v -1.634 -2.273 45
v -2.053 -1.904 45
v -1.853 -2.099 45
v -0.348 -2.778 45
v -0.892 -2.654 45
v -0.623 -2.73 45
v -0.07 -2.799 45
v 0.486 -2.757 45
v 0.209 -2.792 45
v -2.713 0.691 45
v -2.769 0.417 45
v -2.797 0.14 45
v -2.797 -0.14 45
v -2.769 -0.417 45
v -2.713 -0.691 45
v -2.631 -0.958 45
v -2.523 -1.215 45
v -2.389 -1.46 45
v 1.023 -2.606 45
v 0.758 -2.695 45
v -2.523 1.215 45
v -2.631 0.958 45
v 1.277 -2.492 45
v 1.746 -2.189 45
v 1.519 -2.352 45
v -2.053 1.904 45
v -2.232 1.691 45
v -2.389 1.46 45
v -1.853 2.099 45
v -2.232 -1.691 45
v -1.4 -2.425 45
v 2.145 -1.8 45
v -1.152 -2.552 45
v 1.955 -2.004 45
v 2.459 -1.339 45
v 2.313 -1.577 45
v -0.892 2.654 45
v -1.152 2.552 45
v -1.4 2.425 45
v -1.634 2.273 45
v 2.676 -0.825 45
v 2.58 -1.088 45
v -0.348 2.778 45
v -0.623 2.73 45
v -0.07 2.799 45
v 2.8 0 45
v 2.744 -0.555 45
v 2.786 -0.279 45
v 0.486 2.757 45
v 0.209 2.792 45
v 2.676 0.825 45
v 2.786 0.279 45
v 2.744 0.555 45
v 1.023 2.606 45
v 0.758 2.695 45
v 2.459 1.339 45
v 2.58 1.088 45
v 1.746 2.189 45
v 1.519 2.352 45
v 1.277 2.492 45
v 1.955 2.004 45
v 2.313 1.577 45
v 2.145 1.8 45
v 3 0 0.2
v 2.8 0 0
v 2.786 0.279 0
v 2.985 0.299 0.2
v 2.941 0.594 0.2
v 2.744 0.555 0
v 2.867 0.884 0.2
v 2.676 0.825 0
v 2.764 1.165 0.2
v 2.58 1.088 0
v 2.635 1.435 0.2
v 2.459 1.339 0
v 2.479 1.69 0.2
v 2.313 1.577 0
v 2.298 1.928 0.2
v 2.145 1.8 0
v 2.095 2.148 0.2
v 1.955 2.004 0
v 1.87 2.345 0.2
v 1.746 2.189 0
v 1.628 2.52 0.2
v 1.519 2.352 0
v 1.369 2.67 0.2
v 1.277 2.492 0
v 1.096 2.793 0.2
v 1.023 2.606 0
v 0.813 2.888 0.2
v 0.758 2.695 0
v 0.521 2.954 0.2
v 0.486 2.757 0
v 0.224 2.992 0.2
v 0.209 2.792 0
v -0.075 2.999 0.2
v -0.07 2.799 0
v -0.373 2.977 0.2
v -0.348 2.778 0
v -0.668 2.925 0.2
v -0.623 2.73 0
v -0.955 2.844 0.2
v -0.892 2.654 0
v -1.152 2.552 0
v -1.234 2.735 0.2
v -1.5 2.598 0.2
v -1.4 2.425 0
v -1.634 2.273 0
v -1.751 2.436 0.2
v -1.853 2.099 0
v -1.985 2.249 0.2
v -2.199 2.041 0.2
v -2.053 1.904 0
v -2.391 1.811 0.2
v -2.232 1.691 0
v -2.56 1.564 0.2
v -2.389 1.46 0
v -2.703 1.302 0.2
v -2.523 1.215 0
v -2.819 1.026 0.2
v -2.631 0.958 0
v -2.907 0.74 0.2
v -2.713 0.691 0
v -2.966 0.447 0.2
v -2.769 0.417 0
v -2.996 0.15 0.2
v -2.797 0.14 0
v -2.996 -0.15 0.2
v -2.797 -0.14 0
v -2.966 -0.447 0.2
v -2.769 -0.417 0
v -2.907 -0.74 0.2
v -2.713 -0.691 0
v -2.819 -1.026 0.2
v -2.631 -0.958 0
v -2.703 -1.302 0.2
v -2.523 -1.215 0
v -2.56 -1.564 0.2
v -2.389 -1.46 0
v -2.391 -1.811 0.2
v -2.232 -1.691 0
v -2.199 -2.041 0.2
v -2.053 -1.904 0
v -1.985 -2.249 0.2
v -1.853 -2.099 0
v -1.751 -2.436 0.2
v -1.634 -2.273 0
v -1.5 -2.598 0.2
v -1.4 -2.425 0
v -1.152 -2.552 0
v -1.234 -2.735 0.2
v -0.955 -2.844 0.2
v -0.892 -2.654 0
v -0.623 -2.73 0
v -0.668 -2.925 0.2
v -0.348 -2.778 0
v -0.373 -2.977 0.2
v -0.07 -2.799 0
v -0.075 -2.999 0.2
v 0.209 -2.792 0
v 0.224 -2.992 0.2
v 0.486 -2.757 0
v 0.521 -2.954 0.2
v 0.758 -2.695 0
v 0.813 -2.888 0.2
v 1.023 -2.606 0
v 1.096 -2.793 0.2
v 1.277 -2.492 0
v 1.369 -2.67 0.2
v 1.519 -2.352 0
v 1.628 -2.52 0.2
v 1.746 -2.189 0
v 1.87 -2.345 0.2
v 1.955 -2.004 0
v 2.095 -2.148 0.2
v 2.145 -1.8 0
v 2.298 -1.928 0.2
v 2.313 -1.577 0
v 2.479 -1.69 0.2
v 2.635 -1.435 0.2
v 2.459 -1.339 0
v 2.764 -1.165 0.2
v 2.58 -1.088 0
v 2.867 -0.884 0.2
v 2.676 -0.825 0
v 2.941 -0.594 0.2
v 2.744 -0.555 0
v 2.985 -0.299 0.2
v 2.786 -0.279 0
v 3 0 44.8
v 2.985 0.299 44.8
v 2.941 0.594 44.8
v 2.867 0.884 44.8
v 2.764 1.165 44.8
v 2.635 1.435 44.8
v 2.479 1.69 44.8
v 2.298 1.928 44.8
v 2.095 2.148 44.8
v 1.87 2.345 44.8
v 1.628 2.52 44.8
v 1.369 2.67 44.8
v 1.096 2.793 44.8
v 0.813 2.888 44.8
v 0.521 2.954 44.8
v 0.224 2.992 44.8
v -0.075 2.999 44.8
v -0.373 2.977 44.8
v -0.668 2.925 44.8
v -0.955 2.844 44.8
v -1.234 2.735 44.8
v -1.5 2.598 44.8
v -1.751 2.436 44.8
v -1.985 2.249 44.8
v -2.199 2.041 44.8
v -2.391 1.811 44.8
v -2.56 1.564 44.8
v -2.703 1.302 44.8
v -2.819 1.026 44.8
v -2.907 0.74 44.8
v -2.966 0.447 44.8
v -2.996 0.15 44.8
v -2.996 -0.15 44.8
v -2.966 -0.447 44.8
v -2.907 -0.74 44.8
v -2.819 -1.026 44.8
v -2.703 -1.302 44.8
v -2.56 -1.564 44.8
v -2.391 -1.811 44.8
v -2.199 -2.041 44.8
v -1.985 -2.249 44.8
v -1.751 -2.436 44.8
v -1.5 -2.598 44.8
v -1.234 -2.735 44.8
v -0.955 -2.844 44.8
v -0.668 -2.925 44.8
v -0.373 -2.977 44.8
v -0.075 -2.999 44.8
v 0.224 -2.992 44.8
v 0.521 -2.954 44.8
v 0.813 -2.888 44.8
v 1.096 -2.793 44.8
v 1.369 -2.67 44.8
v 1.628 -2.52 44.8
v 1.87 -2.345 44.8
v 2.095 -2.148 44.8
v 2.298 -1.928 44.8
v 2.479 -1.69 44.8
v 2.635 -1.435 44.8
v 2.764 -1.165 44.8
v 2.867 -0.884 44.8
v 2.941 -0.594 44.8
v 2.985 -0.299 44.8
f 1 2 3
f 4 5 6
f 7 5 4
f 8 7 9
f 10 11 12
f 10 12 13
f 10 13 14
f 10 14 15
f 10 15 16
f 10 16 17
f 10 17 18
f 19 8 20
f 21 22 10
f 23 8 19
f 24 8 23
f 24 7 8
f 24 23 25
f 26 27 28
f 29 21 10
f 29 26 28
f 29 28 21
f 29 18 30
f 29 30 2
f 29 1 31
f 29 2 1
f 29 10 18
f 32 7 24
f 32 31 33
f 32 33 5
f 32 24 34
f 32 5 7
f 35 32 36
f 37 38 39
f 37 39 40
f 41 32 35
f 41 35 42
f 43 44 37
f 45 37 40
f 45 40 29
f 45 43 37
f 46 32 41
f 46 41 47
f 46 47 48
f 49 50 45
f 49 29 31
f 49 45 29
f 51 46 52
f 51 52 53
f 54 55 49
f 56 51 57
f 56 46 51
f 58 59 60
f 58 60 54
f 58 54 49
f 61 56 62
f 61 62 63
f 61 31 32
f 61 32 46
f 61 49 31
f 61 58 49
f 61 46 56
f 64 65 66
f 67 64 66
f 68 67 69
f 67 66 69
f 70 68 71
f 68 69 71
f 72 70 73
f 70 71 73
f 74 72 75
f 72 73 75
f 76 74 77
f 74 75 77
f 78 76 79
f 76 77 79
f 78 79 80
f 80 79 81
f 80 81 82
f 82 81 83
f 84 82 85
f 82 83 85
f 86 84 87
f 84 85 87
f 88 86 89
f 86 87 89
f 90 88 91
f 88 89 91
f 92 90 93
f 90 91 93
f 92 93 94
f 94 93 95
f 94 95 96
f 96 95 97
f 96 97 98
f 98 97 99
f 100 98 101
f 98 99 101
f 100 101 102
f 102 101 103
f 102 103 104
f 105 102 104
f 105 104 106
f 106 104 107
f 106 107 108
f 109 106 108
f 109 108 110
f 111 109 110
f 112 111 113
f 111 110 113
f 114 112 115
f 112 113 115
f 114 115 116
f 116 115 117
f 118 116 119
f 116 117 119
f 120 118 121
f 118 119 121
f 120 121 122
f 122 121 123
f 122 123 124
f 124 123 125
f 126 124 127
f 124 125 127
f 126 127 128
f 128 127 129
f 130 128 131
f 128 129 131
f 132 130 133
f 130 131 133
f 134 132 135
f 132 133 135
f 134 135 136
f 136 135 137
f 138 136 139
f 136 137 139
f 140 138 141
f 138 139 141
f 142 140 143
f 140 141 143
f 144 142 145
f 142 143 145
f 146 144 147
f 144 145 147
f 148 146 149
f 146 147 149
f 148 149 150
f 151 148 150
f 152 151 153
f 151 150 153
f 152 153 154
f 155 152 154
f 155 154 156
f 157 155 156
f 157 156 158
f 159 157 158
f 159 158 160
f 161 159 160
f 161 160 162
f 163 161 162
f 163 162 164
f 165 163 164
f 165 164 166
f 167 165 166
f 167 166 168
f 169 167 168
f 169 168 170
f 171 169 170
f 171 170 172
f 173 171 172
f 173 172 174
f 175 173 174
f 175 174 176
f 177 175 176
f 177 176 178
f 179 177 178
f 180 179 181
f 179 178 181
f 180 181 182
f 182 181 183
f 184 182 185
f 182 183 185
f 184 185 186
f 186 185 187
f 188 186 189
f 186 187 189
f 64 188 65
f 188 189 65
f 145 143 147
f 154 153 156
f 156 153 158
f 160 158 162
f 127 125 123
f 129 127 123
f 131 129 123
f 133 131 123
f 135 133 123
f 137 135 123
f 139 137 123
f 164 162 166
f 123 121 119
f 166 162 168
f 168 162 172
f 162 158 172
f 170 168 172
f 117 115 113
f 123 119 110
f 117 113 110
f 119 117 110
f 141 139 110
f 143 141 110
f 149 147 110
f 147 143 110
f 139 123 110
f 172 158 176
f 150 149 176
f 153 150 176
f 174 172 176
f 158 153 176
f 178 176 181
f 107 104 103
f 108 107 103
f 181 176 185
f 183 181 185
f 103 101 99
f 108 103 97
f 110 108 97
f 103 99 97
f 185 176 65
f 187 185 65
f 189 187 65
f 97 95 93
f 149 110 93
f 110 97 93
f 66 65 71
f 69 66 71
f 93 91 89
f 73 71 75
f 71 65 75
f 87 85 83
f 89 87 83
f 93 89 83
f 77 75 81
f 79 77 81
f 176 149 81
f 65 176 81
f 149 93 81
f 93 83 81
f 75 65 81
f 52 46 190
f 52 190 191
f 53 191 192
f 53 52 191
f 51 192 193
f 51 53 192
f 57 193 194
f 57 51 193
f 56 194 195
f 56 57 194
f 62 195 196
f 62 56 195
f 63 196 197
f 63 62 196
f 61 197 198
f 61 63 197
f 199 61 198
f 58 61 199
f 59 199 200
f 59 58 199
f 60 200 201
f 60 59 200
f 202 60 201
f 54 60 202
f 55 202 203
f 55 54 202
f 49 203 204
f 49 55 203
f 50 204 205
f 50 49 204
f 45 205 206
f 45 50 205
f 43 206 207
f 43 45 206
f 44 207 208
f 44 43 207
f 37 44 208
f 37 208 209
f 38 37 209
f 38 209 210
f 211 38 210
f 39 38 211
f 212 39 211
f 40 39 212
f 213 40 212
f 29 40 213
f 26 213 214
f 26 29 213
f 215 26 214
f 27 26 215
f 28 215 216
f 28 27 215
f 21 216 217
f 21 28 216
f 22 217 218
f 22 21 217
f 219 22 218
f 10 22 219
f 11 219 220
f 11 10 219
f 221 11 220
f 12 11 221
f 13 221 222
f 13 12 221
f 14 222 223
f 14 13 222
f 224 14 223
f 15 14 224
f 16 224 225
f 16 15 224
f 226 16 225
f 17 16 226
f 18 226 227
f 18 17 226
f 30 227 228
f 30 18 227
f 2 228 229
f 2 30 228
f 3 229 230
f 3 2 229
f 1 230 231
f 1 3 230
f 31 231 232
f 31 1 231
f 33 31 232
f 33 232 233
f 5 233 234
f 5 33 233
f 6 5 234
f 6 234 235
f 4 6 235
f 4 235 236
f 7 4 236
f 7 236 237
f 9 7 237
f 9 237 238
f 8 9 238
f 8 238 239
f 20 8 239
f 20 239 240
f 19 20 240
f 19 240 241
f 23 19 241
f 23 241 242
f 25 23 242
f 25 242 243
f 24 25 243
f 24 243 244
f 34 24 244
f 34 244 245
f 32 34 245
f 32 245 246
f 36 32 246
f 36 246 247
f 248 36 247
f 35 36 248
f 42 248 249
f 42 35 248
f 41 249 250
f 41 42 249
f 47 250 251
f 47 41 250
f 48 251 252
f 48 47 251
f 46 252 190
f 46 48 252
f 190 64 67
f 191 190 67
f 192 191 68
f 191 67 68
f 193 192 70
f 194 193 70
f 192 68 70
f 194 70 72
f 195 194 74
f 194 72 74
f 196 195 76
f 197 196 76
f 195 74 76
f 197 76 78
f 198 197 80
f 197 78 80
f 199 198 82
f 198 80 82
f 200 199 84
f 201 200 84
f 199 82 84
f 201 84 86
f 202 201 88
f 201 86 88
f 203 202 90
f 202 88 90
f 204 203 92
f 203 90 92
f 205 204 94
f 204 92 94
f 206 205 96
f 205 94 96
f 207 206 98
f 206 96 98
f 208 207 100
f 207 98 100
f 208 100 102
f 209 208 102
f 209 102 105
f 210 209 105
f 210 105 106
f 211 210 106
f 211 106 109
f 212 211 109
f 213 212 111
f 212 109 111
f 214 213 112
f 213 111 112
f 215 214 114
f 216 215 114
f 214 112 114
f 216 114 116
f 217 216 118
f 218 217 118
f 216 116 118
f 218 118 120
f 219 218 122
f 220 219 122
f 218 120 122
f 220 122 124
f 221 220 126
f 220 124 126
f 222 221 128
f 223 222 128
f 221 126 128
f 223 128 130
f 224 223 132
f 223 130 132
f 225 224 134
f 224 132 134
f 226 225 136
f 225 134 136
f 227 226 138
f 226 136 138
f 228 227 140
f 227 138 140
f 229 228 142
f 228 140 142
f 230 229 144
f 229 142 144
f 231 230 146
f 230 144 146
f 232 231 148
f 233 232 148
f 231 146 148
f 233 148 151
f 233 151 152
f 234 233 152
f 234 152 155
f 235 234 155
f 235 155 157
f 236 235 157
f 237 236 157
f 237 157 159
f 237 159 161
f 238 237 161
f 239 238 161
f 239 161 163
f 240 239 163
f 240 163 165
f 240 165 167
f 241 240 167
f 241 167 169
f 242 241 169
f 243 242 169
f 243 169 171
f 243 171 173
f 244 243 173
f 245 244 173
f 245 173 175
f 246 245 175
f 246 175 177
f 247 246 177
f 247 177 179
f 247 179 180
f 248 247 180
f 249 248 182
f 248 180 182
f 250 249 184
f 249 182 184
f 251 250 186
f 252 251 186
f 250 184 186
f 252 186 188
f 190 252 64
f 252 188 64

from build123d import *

# Parameters (mm, degrees)
SKETCH_R        = 3
PAD_DEPTH       = 45
CHAMFER_SIZE    = 0.2
CHAMFER001_SIZE = 0.2


with BuildPart() as part:
    # Sketch → Pad (new body)
    with BuildSketch(Plane.XY):
        Circle(SKETCH_R)
    extrude(amount=PAD_DEPTH)

    # Chamfer
    chamfer_edges = [part.edges().sort_by_distance(p)[0] for p in [
        (-3, 0, 45),
    ]]
    chamfer(chamfer_edges, length=CHAMFER_SIZE)

    # Chamfer001
    chamfer001_edges = [part.edges().sort_by_distance(p)[0] for p in [
        (-3, 0, 0),
    ]]
    chamfer(chamfer001_edges, length=CHAMFER001_SIZE)


solid = part.part
